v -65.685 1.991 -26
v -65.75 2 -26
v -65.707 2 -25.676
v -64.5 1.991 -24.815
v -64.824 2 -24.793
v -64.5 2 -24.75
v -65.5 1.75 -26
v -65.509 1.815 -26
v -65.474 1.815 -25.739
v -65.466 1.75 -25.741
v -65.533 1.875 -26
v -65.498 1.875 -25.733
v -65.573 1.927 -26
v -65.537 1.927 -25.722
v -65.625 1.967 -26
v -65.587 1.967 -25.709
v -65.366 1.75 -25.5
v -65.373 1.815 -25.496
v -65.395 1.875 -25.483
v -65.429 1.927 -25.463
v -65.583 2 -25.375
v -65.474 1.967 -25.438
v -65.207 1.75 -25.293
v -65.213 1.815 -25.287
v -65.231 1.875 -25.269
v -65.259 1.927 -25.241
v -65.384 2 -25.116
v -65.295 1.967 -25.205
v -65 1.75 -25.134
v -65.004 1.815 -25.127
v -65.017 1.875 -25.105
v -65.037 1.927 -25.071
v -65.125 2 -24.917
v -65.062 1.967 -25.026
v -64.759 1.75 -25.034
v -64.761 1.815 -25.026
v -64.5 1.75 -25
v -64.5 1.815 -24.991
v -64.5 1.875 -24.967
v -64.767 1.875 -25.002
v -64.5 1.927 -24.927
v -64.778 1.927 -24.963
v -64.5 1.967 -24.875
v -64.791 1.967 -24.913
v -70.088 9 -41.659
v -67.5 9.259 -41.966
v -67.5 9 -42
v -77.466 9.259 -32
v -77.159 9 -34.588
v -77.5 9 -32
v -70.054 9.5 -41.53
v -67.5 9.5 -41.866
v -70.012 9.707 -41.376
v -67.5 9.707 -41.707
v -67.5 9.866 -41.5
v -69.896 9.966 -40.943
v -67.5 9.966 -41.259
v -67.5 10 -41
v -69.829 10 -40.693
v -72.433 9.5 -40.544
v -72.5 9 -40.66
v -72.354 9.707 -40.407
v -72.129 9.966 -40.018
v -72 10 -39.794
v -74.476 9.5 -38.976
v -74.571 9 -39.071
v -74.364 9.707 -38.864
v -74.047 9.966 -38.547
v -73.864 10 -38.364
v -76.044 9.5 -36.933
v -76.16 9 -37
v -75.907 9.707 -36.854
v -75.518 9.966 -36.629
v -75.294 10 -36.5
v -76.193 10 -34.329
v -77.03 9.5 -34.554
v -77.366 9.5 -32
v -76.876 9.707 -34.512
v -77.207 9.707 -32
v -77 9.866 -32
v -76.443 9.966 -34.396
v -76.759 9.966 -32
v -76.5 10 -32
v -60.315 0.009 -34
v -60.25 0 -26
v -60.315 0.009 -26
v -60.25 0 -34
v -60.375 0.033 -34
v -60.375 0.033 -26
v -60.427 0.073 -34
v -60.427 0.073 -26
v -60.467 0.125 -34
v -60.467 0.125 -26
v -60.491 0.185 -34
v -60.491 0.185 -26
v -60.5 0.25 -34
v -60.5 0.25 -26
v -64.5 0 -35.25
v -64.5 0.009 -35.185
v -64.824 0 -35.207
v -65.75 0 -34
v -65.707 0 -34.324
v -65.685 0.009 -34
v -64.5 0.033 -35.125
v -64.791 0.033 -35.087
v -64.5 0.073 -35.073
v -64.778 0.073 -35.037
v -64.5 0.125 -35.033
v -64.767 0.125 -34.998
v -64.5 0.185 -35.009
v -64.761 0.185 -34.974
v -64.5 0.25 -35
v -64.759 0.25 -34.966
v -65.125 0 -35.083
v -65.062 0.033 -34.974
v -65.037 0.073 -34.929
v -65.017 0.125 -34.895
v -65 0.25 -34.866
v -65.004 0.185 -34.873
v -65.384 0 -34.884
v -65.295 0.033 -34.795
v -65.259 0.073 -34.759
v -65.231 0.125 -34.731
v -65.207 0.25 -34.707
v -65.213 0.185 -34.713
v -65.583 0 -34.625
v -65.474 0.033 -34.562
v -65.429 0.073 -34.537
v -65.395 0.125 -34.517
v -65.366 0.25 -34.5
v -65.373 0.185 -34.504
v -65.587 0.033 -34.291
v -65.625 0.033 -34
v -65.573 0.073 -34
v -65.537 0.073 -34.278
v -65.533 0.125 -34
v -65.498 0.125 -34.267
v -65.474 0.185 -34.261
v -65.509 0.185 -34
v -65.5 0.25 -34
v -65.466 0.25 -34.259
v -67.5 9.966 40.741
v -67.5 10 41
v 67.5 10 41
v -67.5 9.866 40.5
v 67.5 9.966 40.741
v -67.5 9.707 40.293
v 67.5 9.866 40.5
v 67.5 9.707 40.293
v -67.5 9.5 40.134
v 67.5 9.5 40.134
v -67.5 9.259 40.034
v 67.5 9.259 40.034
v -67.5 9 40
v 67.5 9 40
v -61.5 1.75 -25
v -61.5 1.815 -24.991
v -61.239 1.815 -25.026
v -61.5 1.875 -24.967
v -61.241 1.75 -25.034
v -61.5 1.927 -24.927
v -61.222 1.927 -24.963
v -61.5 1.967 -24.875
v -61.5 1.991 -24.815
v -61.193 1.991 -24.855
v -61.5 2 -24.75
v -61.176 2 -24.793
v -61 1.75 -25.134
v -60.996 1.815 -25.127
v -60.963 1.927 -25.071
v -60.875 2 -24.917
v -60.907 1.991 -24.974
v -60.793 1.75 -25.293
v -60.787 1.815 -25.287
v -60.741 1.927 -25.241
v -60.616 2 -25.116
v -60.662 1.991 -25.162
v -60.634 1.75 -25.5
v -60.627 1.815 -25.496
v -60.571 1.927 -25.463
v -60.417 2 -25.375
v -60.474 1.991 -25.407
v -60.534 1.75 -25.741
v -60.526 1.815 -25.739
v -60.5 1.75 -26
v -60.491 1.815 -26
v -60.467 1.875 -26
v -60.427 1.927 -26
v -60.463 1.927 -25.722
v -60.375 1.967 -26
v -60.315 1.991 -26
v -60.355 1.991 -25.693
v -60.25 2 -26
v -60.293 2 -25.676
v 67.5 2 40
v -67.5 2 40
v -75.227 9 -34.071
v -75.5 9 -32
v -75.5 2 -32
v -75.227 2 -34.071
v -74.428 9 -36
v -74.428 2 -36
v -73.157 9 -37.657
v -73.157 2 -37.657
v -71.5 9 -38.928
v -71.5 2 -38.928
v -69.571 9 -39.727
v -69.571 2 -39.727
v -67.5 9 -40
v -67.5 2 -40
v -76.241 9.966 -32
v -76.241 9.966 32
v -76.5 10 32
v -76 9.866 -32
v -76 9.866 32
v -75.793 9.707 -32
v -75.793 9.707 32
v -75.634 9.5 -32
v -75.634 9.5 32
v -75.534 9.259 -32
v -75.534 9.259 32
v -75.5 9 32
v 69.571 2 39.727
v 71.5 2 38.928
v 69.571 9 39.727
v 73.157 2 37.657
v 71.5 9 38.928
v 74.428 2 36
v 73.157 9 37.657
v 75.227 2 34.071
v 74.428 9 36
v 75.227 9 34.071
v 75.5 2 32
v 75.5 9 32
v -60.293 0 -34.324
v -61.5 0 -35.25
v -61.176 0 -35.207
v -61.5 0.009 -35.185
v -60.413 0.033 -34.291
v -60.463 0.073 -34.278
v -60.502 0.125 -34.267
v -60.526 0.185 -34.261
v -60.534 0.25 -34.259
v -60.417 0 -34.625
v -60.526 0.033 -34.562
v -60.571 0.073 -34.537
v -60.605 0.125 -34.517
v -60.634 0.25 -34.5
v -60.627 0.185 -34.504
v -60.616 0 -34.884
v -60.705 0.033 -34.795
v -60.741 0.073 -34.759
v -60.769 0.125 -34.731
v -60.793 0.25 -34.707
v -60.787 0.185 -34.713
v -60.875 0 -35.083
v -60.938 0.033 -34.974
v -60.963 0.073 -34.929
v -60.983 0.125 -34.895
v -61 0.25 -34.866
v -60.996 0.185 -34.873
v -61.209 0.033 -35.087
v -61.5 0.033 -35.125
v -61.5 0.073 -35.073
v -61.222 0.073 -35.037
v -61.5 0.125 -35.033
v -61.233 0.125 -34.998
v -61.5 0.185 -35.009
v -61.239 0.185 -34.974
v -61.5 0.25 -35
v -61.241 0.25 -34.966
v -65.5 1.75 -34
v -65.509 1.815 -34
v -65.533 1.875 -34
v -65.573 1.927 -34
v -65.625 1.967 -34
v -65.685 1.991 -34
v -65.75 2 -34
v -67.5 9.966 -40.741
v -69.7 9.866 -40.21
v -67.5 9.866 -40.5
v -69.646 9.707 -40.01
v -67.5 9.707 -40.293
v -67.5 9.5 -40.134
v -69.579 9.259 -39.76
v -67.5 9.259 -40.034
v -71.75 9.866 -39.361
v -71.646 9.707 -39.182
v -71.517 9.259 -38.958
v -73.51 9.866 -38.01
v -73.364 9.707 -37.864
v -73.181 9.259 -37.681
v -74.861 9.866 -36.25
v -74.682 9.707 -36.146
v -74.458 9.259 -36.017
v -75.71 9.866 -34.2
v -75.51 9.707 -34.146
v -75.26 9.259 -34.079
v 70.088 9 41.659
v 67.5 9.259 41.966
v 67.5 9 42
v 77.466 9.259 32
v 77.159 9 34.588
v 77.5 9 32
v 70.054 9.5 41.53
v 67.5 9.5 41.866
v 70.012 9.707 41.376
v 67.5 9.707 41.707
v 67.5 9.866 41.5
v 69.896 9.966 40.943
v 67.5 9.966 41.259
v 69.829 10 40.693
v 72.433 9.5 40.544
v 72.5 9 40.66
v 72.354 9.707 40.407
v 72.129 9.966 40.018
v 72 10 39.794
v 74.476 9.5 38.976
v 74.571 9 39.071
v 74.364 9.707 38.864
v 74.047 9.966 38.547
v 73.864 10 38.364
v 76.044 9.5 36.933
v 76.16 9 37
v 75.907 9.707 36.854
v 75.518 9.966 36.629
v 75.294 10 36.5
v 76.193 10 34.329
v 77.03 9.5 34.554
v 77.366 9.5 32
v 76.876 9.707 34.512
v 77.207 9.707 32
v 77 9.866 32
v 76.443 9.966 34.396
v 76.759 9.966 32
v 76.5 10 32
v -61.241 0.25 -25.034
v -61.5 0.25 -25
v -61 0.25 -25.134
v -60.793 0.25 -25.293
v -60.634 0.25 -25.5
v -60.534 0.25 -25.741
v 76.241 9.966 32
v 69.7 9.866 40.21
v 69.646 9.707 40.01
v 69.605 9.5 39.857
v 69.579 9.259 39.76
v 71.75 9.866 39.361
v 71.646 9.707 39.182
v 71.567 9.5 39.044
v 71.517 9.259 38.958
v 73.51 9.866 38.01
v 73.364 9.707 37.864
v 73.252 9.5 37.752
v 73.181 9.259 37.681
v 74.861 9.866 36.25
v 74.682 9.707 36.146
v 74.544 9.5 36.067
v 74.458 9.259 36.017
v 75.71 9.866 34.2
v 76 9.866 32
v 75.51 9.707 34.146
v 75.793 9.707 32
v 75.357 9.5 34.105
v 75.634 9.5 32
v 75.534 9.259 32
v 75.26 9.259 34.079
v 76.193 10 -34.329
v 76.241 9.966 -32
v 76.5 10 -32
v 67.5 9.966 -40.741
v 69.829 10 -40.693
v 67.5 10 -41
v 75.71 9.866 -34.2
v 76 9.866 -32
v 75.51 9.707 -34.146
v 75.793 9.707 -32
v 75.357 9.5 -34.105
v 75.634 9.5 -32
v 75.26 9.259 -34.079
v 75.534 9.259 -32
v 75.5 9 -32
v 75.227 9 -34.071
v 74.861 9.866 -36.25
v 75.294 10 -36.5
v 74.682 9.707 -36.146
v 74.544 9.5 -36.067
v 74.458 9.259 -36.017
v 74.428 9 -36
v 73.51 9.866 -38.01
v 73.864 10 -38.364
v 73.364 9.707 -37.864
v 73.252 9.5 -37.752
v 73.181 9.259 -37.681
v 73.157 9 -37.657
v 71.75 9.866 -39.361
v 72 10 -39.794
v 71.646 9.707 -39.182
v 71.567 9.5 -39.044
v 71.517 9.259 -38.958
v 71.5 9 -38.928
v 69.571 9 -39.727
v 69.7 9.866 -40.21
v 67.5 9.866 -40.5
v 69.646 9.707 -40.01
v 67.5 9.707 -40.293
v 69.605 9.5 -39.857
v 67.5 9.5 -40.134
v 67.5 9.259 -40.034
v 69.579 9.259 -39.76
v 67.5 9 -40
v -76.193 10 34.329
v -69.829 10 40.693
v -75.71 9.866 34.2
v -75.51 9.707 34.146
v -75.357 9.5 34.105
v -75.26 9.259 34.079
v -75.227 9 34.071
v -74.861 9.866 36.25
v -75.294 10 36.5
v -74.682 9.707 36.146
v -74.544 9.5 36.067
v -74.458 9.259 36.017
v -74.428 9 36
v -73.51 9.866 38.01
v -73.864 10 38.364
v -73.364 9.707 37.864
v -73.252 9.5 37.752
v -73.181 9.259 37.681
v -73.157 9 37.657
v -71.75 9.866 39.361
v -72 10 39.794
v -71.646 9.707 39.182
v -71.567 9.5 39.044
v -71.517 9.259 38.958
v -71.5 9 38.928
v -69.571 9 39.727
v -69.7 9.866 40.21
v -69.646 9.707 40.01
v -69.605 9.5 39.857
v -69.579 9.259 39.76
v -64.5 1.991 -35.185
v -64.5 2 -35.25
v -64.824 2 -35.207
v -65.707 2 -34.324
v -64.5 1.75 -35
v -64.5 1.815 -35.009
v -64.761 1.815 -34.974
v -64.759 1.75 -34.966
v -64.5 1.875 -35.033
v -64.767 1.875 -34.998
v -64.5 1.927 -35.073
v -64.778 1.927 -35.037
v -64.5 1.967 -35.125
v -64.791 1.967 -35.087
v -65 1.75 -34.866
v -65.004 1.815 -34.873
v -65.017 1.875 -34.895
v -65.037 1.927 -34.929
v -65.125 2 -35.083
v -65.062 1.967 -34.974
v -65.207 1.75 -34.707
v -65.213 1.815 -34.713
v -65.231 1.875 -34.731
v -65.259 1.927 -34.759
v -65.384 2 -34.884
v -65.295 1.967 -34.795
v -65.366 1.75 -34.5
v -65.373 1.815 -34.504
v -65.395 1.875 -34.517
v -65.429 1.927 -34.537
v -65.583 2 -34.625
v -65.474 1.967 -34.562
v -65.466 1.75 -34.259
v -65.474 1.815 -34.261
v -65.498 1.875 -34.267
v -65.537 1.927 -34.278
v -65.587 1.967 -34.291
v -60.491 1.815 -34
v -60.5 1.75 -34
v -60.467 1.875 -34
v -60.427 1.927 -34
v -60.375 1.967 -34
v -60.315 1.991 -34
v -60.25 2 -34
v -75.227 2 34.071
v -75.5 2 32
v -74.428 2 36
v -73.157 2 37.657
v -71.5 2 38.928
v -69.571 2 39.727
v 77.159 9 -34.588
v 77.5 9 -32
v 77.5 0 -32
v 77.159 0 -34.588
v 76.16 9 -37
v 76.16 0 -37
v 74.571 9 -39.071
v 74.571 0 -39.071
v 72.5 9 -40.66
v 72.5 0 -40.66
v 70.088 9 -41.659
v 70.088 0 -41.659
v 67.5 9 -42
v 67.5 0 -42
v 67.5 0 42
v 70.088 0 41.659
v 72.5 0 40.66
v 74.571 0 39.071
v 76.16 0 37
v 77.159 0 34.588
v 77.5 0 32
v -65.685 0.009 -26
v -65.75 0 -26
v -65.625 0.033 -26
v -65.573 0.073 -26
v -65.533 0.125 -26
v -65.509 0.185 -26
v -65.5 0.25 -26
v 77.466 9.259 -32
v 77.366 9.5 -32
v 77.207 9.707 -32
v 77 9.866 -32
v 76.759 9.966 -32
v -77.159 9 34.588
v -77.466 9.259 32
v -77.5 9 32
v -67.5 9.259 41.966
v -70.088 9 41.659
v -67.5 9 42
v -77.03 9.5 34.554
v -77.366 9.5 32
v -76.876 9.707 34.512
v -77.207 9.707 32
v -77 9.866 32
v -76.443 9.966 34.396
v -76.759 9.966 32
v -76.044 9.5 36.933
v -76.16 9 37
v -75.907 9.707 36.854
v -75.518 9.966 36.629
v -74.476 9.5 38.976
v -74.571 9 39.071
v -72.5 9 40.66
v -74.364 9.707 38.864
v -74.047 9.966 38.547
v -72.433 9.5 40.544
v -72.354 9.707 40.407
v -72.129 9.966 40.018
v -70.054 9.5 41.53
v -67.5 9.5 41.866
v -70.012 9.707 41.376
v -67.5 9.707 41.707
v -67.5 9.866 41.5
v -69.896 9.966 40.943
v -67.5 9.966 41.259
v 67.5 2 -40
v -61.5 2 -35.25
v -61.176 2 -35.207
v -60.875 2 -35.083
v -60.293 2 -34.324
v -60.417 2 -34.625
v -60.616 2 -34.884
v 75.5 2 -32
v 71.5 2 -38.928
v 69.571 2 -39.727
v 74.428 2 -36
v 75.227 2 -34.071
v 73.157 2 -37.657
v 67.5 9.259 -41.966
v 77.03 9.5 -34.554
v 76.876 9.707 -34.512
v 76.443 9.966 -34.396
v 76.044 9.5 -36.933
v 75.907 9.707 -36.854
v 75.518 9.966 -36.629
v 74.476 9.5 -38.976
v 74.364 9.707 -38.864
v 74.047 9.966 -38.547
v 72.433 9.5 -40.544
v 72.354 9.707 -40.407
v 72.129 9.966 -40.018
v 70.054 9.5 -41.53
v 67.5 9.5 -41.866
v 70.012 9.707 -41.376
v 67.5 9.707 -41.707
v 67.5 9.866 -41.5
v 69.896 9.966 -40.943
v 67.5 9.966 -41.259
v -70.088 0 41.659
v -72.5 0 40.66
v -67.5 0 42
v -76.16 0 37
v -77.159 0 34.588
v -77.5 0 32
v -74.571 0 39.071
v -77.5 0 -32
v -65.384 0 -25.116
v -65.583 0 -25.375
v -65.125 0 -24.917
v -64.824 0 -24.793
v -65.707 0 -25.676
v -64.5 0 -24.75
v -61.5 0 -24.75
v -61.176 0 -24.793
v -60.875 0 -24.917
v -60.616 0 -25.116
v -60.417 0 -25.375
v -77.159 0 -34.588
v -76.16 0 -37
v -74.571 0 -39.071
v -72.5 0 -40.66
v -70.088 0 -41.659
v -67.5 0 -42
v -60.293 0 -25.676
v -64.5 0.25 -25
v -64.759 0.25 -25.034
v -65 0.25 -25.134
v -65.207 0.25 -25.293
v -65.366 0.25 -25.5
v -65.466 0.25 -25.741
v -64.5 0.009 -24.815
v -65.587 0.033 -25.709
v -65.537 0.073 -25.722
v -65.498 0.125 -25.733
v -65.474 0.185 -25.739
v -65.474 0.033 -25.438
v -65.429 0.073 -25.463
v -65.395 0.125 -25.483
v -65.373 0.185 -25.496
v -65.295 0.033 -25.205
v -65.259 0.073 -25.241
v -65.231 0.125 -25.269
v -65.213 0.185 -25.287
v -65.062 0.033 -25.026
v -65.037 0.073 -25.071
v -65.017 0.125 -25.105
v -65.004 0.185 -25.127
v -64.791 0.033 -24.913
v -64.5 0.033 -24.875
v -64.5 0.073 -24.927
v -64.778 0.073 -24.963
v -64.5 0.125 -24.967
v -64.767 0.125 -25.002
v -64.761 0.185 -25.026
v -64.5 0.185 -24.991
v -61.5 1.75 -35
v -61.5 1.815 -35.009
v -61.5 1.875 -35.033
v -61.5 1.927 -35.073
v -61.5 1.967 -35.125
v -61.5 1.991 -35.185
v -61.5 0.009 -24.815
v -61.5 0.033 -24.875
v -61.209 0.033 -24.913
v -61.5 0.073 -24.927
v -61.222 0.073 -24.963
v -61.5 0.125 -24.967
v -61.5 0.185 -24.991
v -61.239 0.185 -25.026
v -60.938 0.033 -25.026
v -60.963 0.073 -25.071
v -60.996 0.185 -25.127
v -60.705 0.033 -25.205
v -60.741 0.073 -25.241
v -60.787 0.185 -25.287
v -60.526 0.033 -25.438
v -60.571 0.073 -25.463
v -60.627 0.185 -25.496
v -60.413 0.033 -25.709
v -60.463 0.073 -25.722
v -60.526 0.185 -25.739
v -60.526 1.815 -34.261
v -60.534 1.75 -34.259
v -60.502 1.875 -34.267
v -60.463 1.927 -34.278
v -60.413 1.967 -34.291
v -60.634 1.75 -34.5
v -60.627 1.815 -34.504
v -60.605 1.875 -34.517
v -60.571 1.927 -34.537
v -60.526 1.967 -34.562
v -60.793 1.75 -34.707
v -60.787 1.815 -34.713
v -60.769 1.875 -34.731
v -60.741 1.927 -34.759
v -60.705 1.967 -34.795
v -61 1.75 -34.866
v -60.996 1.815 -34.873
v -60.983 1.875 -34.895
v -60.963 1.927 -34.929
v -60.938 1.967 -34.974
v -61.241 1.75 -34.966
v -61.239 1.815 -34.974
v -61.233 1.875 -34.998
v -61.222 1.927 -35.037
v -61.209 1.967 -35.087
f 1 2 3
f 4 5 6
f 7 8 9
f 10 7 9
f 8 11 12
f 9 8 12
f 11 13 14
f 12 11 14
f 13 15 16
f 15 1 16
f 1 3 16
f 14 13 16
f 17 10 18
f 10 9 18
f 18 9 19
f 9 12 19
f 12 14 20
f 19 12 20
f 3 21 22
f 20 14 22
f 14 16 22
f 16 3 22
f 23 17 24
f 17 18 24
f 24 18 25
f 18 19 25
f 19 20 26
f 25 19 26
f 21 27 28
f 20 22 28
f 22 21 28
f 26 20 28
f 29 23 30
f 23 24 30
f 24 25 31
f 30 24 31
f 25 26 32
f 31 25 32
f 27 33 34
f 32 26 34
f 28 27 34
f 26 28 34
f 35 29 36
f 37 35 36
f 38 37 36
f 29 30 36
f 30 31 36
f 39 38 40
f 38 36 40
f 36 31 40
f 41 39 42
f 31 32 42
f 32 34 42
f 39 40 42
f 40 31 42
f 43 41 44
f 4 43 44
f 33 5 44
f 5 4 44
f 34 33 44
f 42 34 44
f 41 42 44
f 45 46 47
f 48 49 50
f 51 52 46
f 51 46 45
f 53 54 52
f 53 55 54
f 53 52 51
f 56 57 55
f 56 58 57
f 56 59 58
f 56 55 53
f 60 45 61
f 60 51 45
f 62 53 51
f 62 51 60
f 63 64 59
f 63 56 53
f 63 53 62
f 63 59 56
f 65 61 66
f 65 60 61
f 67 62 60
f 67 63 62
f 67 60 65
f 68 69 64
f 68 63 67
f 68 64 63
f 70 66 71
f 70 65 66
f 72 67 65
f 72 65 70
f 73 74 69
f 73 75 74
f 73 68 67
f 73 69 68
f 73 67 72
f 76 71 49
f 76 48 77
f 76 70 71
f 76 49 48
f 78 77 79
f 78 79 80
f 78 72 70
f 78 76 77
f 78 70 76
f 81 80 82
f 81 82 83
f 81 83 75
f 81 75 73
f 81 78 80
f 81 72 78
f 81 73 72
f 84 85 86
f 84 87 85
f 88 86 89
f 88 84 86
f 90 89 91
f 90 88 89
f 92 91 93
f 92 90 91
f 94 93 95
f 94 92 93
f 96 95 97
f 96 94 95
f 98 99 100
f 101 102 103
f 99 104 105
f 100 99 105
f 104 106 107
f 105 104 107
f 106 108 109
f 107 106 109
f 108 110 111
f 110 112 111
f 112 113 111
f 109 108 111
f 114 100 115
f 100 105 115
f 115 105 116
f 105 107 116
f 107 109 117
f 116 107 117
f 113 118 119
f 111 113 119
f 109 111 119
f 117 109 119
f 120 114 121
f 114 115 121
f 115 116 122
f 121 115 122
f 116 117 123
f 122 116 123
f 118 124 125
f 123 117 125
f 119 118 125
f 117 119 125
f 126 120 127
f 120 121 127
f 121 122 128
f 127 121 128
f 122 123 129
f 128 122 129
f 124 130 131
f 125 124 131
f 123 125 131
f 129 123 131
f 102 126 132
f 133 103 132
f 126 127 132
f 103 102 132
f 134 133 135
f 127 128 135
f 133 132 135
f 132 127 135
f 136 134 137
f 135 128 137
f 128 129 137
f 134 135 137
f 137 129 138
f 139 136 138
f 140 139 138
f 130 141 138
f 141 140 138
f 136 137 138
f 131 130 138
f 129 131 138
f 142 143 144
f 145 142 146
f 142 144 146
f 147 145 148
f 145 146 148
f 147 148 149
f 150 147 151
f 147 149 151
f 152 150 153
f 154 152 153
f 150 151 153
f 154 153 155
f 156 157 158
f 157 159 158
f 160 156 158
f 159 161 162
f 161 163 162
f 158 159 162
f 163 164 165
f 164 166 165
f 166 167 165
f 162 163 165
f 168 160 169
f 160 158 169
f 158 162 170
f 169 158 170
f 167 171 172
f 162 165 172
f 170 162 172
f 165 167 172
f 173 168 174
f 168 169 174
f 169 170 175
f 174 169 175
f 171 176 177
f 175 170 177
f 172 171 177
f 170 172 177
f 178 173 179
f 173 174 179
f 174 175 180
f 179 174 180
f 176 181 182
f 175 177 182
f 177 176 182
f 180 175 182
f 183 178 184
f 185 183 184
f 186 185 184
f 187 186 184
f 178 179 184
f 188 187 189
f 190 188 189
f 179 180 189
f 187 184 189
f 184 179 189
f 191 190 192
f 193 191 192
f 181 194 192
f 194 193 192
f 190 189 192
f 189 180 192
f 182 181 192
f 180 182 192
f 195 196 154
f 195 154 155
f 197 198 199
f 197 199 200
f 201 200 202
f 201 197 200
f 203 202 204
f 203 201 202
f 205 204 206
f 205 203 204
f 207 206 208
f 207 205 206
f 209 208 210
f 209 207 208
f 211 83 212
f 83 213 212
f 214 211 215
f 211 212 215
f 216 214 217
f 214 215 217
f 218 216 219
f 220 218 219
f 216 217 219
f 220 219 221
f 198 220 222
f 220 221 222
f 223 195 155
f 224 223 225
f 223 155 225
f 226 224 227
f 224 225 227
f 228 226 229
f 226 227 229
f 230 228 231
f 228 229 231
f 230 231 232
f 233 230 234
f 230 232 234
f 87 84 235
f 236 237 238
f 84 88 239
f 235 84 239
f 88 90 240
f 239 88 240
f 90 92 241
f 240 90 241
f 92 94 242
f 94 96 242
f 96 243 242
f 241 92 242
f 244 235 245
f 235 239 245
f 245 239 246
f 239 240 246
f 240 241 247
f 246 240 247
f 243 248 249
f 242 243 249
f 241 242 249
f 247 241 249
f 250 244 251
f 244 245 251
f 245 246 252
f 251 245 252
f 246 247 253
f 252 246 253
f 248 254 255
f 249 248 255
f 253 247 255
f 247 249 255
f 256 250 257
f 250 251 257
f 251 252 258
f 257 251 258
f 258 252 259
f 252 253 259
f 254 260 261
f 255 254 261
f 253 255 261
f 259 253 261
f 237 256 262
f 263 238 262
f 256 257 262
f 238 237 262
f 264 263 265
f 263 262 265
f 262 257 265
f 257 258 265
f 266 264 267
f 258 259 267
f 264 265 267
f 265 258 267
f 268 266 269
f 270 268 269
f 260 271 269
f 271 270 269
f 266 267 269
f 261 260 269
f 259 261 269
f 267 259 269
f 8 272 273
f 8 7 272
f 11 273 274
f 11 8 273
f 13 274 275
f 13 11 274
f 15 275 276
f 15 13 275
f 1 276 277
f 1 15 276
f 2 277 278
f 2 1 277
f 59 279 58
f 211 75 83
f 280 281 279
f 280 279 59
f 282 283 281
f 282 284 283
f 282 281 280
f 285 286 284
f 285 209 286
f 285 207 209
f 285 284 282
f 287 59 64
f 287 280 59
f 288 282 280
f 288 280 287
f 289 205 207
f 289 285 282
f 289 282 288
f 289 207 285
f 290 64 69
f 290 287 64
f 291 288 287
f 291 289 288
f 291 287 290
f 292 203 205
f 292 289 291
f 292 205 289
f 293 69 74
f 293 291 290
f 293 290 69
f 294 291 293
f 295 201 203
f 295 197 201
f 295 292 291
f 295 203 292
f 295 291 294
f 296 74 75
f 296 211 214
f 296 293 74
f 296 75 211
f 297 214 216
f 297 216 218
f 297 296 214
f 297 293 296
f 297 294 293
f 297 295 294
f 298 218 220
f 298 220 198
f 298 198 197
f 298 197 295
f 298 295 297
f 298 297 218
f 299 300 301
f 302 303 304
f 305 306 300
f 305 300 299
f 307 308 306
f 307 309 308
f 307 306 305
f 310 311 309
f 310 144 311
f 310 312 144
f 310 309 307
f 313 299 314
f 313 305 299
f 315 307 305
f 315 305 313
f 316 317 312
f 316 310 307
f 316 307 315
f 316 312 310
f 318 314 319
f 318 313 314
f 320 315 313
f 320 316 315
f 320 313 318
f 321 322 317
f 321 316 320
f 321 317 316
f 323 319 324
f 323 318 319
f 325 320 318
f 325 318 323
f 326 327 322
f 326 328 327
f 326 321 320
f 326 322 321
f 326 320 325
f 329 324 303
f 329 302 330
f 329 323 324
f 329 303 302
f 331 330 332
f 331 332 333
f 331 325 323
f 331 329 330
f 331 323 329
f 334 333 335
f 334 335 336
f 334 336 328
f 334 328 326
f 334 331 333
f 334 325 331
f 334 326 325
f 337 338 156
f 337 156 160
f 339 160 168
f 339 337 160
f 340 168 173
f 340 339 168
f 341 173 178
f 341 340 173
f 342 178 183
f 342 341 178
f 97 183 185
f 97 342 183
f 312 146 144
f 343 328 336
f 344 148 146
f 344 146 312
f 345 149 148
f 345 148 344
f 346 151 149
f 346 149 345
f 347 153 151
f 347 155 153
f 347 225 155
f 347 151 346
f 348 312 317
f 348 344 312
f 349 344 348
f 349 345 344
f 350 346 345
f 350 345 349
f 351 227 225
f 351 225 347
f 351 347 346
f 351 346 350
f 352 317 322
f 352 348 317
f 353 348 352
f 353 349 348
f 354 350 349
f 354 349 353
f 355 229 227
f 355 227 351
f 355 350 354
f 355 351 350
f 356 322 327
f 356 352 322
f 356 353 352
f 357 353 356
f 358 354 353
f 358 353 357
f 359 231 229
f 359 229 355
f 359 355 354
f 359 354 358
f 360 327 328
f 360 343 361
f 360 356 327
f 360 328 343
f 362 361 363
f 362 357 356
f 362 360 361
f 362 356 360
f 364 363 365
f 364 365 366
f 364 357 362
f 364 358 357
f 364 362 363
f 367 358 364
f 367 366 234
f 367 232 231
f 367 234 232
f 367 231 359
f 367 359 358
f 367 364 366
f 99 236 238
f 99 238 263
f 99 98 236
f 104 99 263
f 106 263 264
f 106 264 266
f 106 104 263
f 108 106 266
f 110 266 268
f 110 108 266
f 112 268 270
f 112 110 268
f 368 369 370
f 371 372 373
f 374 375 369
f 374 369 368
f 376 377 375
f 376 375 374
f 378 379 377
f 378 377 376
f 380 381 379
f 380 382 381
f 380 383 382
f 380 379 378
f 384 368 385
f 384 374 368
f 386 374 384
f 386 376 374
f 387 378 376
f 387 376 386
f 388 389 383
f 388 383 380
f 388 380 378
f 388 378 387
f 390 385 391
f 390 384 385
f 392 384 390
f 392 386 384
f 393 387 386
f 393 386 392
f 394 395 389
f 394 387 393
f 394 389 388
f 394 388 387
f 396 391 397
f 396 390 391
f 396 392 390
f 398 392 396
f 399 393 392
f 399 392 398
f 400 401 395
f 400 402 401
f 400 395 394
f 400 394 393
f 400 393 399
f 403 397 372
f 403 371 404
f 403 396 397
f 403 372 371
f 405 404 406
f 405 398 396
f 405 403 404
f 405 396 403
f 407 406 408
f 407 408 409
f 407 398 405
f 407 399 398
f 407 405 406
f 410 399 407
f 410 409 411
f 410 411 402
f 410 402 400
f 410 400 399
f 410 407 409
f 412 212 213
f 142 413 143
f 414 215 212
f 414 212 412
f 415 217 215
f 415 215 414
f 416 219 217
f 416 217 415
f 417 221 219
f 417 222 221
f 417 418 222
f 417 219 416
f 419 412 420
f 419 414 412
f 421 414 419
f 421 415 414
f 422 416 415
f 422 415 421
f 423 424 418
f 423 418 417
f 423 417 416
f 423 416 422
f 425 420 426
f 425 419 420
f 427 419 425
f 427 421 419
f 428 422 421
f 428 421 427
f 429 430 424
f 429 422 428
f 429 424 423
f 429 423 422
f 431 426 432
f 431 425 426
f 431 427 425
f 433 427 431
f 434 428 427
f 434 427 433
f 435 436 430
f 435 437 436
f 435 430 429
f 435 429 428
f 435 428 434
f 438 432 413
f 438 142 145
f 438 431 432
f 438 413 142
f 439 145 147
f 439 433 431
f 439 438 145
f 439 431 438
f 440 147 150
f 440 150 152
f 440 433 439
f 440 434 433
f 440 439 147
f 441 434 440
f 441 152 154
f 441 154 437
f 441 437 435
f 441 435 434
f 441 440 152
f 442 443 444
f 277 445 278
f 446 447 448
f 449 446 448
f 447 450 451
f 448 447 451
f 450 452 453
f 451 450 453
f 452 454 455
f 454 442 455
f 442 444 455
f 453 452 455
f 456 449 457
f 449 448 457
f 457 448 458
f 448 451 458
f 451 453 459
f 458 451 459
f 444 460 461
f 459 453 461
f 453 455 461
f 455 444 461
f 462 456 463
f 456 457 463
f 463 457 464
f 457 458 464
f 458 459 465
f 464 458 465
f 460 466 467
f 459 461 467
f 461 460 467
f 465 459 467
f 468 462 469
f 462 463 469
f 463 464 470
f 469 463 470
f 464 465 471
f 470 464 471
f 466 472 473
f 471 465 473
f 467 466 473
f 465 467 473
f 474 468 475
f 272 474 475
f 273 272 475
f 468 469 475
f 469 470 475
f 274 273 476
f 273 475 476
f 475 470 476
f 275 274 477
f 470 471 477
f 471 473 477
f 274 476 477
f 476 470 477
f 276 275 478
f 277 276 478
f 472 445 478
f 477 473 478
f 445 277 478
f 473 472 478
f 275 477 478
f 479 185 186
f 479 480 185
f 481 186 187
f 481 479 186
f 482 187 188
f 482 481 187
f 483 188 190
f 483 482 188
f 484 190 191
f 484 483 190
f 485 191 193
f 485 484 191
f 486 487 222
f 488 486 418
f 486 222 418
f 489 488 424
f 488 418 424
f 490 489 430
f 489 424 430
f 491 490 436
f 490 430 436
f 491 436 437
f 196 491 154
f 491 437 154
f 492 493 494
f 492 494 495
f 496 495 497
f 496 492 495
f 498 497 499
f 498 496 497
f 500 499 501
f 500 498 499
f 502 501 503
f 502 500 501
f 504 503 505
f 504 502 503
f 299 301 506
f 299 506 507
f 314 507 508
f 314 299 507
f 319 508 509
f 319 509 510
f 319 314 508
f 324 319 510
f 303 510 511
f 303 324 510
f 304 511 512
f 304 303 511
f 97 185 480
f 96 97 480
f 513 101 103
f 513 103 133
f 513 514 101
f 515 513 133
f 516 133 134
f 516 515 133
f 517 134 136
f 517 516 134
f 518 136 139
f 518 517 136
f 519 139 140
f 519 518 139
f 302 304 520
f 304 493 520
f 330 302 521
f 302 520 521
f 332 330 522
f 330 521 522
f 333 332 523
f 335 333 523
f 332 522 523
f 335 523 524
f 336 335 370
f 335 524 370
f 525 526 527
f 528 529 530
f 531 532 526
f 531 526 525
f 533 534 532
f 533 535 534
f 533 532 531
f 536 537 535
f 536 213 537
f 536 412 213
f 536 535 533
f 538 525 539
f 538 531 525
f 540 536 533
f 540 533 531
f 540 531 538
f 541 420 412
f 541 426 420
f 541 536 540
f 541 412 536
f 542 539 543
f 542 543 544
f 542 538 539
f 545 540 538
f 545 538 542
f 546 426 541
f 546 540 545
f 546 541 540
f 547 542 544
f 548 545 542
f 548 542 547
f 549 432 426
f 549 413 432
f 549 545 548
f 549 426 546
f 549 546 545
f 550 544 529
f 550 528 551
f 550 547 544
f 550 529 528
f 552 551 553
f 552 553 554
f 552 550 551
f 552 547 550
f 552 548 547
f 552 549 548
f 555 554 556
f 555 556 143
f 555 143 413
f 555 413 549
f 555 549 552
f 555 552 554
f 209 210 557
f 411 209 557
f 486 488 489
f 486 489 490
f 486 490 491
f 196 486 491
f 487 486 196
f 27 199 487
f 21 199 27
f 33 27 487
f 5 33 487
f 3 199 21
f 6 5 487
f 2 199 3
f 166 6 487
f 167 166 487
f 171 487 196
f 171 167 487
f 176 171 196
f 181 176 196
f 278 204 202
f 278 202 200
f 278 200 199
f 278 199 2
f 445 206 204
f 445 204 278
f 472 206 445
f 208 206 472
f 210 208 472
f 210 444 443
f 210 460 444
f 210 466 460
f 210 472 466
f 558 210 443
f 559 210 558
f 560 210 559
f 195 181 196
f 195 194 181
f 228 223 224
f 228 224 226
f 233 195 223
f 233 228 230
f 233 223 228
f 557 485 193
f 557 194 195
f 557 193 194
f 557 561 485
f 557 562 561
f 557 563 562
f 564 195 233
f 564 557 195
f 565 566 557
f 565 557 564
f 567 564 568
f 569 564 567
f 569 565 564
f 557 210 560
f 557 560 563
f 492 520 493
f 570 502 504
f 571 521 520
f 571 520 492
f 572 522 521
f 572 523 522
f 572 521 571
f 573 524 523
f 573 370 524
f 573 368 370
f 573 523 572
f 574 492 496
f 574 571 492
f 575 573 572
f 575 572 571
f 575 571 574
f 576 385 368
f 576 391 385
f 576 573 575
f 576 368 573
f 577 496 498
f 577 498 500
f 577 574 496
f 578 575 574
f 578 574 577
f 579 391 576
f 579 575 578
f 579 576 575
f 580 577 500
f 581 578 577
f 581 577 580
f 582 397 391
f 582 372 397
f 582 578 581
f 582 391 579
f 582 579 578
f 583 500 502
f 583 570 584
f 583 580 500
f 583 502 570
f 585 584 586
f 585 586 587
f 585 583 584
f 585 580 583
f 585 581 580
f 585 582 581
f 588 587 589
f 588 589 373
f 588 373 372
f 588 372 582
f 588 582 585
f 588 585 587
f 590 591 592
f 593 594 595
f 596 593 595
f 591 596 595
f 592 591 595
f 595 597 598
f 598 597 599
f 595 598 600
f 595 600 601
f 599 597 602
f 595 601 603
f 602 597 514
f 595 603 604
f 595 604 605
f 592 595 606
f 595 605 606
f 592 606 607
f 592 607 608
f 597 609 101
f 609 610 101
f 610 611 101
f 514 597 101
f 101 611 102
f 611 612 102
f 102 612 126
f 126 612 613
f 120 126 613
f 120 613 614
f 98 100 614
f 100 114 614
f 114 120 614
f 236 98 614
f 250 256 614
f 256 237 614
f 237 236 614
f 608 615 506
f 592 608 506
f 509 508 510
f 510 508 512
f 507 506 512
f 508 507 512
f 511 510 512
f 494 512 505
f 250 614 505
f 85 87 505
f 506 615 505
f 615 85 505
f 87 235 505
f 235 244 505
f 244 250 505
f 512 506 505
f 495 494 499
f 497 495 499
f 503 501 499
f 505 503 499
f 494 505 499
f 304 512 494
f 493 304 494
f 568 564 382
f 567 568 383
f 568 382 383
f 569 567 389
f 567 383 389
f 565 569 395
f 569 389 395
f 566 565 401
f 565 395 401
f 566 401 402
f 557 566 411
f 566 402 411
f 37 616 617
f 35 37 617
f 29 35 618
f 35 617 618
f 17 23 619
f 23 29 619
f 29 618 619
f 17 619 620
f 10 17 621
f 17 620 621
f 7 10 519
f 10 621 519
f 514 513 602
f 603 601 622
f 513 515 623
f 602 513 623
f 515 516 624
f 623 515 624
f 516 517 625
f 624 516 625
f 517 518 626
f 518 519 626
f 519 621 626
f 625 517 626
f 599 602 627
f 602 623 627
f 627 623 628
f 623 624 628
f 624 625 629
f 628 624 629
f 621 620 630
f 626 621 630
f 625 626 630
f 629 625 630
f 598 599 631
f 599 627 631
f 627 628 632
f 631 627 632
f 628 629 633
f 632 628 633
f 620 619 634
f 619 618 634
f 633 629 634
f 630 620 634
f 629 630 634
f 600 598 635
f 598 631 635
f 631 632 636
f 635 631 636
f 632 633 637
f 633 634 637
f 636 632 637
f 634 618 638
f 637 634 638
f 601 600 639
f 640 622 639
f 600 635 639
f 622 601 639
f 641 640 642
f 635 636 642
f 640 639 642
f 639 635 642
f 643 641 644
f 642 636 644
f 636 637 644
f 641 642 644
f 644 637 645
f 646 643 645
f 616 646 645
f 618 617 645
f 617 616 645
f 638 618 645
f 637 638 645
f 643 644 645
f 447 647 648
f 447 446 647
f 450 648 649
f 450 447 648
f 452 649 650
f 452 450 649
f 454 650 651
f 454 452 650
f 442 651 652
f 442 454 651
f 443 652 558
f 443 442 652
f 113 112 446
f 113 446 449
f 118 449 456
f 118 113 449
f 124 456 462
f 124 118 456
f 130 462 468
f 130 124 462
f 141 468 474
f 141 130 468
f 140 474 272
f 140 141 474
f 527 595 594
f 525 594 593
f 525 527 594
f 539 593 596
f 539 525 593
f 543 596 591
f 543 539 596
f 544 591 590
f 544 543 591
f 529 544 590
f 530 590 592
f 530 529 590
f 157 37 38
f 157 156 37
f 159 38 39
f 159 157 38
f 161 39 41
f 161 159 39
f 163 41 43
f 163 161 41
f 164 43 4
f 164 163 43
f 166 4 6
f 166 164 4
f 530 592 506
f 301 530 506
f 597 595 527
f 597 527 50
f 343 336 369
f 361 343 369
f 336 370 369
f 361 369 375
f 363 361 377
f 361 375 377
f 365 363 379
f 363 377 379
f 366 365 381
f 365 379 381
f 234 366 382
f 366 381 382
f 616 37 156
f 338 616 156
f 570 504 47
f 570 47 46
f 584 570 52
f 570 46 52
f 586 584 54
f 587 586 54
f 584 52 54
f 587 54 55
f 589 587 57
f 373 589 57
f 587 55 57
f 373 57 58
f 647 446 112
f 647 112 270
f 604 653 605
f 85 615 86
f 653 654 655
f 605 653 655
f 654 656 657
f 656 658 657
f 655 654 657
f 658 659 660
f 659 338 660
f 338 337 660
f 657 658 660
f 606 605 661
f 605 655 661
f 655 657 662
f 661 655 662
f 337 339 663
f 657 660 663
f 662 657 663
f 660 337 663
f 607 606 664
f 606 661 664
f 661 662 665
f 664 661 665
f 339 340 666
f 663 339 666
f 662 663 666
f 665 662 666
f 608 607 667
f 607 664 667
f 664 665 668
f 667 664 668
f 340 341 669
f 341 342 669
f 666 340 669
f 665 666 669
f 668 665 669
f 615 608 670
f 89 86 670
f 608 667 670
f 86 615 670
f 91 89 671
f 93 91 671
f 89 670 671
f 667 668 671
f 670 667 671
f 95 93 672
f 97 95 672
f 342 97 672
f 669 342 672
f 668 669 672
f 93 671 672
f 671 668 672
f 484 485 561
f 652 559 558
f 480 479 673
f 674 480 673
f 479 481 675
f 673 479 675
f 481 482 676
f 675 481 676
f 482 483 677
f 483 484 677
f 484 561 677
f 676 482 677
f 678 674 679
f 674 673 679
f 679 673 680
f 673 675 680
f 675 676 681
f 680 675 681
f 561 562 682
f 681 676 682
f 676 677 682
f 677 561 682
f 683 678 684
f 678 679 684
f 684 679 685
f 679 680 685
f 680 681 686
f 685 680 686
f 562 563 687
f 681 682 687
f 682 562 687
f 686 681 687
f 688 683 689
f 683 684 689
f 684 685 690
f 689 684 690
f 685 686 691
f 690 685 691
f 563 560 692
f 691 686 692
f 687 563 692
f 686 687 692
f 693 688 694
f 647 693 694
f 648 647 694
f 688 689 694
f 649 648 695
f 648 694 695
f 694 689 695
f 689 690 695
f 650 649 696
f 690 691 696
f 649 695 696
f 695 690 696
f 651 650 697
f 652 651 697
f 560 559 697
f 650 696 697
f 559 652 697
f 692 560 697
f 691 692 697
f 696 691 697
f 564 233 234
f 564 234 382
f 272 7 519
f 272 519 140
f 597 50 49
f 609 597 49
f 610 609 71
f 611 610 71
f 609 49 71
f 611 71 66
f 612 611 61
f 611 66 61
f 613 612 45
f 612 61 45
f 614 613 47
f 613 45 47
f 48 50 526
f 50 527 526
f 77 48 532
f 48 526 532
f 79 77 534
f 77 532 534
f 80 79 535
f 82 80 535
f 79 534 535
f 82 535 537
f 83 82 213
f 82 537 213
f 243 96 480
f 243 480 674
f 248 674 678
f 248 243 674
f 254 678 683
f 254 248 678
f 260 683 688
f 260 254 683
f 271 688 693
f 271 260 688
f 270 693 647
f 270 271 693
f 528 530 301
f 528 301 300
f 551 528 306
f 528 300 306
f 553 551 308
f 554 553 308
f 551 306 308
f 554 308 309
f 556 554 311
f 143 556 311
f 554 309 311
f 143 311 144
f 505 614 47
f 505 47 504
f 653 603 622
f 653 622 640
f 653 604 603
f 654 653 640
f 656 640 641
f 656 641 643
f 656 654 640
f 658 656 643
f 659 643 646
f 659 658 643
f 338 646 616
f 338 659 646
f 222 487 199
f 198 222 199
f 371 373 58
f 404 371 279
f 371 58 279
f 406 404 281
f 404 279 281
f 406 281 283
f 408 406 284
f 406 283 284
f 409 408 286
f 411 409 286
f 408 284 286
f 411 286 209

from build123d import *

# Parameters (mm, degrees)
SKETCH1_W           = 155
SKETCH1_H           = 84
BOSS_EXTRUDE1_DEPTH = 10
FILLET1_R           = 10
SHELL1_T            = -2
SKETCH2_W           = 5
SKETCH2_H           = 10
CUT_EXTRUDE1_DEPTH  = 89.511298714
FILLET2_R           = 1
FILLET3_R           = 0.25
FILLET4_R           = 1


with BuildPart() as part:
    # Sketch1 → Boss-Extrude1 (new body)
    with BuildSketch(Plane(origin=(0, 0, 0), x_dir=(1, 0, 0), z_dir=(0, 1, 0))):
        Rectangle(SKETCH1_W, SKETCH1_H)
    extrude(amount=BOSS_EXTRUDE1_DEPTH)

    # Fillet1
    fillet1_edges = [part.edges().sort_by_distance(p)[0] for p in [
        (77.5, 5, 42),
        (-77.5, 5, 42),
        (-77.5, 5, -42),
        (77.5, 5, -42),
    ]]
    fillet(fillet1_edges, radius=FILLET1_R)

    # Shell1
    shell1_openings = [part.faces().sort_by_distance(p)[0] for p in [
        (0, 10, 0),
    ]]
    offset(amount=SHELL1_T, openings=shell1_openings, kind=Kind.INTERSECTION)

    # Sketch2 → Cut-Extrude1 (cut, through all)
    with BuildSketch(Plane(origin=(0, 2, 0), x_dir=(1, 0, 0), z_dir=(0, 1, 0))):
        with Locations((-63, 30)):
            Rectangle(SKETCH2_W, SKETCH2_H)
    extrude(amount=-CUT_EXTRUDE1_DEPTH, mode=Mode.SUBTRACT)

    # Fillet2
    fillet2_edges = [part.edges().sort_by_distance(p)[0] for p in [
        (-60.5, 1, -35),
        (-60.5, 1, -25),
        (-65.5, 1, -25),
        (-65.5, 1, -35),
    ]]
    fillet(fillet2_edges, radius=FILLET2_R)

    # Fillet3
    fillet3_edges = [part.edges().sort_by_distance(p)[0] for p in [
        (-60.5, 2, -30),
        (-60.5, 0, -30),
        (-63, 2, -25),
        (-63, 0, -25),
        (-65.5, 2, -30),
        (-65.5, 0, -30),
        (-63, 2, -35),
        (-63, 0, -35),
        (-60.792893219, 2, -25.292893219),
        (-60.792893219, 0, -25.292893219),
        (-65.207106781, 2, -25.292893219),
        (-65.207106781, 0, -25.292893219),
        (-65.207106781, 2, -34.707106781),
        (-65.207106781, 0, -34.707106781),
        (-60.792893219, 2, -34.707106781),
        (-60.792893219, 0, -34.707106781),
    ]]
    fillet(fillet3_edges, radius=FILLET3_R)

    # Fillet4
    fillet4_edges = [part.edges().sort_by_distance(p)[0] for p in [
        (0, 10, 42),
        (-77.5, 10, 0),
        (77.5, 10, 0),
        (0, 10, -42),
        (74.571067812, 10, 39.071067812),
        (74.571067812, 10, -39.071067812),
        (-74.571067812, 10, -39.071067812),
        (-74.571067812, 10, 39.071067812),
        (-75.5, 10, 0),
        (0, 10, 40),
        (75.5, 10, 0),
        (0, 10, -40),
    ]]
    fillet(fillet4_edges, radius=FILLET4_R - 0.0001)  # a hair under: the kernel refuses the full size


solid = part.part
